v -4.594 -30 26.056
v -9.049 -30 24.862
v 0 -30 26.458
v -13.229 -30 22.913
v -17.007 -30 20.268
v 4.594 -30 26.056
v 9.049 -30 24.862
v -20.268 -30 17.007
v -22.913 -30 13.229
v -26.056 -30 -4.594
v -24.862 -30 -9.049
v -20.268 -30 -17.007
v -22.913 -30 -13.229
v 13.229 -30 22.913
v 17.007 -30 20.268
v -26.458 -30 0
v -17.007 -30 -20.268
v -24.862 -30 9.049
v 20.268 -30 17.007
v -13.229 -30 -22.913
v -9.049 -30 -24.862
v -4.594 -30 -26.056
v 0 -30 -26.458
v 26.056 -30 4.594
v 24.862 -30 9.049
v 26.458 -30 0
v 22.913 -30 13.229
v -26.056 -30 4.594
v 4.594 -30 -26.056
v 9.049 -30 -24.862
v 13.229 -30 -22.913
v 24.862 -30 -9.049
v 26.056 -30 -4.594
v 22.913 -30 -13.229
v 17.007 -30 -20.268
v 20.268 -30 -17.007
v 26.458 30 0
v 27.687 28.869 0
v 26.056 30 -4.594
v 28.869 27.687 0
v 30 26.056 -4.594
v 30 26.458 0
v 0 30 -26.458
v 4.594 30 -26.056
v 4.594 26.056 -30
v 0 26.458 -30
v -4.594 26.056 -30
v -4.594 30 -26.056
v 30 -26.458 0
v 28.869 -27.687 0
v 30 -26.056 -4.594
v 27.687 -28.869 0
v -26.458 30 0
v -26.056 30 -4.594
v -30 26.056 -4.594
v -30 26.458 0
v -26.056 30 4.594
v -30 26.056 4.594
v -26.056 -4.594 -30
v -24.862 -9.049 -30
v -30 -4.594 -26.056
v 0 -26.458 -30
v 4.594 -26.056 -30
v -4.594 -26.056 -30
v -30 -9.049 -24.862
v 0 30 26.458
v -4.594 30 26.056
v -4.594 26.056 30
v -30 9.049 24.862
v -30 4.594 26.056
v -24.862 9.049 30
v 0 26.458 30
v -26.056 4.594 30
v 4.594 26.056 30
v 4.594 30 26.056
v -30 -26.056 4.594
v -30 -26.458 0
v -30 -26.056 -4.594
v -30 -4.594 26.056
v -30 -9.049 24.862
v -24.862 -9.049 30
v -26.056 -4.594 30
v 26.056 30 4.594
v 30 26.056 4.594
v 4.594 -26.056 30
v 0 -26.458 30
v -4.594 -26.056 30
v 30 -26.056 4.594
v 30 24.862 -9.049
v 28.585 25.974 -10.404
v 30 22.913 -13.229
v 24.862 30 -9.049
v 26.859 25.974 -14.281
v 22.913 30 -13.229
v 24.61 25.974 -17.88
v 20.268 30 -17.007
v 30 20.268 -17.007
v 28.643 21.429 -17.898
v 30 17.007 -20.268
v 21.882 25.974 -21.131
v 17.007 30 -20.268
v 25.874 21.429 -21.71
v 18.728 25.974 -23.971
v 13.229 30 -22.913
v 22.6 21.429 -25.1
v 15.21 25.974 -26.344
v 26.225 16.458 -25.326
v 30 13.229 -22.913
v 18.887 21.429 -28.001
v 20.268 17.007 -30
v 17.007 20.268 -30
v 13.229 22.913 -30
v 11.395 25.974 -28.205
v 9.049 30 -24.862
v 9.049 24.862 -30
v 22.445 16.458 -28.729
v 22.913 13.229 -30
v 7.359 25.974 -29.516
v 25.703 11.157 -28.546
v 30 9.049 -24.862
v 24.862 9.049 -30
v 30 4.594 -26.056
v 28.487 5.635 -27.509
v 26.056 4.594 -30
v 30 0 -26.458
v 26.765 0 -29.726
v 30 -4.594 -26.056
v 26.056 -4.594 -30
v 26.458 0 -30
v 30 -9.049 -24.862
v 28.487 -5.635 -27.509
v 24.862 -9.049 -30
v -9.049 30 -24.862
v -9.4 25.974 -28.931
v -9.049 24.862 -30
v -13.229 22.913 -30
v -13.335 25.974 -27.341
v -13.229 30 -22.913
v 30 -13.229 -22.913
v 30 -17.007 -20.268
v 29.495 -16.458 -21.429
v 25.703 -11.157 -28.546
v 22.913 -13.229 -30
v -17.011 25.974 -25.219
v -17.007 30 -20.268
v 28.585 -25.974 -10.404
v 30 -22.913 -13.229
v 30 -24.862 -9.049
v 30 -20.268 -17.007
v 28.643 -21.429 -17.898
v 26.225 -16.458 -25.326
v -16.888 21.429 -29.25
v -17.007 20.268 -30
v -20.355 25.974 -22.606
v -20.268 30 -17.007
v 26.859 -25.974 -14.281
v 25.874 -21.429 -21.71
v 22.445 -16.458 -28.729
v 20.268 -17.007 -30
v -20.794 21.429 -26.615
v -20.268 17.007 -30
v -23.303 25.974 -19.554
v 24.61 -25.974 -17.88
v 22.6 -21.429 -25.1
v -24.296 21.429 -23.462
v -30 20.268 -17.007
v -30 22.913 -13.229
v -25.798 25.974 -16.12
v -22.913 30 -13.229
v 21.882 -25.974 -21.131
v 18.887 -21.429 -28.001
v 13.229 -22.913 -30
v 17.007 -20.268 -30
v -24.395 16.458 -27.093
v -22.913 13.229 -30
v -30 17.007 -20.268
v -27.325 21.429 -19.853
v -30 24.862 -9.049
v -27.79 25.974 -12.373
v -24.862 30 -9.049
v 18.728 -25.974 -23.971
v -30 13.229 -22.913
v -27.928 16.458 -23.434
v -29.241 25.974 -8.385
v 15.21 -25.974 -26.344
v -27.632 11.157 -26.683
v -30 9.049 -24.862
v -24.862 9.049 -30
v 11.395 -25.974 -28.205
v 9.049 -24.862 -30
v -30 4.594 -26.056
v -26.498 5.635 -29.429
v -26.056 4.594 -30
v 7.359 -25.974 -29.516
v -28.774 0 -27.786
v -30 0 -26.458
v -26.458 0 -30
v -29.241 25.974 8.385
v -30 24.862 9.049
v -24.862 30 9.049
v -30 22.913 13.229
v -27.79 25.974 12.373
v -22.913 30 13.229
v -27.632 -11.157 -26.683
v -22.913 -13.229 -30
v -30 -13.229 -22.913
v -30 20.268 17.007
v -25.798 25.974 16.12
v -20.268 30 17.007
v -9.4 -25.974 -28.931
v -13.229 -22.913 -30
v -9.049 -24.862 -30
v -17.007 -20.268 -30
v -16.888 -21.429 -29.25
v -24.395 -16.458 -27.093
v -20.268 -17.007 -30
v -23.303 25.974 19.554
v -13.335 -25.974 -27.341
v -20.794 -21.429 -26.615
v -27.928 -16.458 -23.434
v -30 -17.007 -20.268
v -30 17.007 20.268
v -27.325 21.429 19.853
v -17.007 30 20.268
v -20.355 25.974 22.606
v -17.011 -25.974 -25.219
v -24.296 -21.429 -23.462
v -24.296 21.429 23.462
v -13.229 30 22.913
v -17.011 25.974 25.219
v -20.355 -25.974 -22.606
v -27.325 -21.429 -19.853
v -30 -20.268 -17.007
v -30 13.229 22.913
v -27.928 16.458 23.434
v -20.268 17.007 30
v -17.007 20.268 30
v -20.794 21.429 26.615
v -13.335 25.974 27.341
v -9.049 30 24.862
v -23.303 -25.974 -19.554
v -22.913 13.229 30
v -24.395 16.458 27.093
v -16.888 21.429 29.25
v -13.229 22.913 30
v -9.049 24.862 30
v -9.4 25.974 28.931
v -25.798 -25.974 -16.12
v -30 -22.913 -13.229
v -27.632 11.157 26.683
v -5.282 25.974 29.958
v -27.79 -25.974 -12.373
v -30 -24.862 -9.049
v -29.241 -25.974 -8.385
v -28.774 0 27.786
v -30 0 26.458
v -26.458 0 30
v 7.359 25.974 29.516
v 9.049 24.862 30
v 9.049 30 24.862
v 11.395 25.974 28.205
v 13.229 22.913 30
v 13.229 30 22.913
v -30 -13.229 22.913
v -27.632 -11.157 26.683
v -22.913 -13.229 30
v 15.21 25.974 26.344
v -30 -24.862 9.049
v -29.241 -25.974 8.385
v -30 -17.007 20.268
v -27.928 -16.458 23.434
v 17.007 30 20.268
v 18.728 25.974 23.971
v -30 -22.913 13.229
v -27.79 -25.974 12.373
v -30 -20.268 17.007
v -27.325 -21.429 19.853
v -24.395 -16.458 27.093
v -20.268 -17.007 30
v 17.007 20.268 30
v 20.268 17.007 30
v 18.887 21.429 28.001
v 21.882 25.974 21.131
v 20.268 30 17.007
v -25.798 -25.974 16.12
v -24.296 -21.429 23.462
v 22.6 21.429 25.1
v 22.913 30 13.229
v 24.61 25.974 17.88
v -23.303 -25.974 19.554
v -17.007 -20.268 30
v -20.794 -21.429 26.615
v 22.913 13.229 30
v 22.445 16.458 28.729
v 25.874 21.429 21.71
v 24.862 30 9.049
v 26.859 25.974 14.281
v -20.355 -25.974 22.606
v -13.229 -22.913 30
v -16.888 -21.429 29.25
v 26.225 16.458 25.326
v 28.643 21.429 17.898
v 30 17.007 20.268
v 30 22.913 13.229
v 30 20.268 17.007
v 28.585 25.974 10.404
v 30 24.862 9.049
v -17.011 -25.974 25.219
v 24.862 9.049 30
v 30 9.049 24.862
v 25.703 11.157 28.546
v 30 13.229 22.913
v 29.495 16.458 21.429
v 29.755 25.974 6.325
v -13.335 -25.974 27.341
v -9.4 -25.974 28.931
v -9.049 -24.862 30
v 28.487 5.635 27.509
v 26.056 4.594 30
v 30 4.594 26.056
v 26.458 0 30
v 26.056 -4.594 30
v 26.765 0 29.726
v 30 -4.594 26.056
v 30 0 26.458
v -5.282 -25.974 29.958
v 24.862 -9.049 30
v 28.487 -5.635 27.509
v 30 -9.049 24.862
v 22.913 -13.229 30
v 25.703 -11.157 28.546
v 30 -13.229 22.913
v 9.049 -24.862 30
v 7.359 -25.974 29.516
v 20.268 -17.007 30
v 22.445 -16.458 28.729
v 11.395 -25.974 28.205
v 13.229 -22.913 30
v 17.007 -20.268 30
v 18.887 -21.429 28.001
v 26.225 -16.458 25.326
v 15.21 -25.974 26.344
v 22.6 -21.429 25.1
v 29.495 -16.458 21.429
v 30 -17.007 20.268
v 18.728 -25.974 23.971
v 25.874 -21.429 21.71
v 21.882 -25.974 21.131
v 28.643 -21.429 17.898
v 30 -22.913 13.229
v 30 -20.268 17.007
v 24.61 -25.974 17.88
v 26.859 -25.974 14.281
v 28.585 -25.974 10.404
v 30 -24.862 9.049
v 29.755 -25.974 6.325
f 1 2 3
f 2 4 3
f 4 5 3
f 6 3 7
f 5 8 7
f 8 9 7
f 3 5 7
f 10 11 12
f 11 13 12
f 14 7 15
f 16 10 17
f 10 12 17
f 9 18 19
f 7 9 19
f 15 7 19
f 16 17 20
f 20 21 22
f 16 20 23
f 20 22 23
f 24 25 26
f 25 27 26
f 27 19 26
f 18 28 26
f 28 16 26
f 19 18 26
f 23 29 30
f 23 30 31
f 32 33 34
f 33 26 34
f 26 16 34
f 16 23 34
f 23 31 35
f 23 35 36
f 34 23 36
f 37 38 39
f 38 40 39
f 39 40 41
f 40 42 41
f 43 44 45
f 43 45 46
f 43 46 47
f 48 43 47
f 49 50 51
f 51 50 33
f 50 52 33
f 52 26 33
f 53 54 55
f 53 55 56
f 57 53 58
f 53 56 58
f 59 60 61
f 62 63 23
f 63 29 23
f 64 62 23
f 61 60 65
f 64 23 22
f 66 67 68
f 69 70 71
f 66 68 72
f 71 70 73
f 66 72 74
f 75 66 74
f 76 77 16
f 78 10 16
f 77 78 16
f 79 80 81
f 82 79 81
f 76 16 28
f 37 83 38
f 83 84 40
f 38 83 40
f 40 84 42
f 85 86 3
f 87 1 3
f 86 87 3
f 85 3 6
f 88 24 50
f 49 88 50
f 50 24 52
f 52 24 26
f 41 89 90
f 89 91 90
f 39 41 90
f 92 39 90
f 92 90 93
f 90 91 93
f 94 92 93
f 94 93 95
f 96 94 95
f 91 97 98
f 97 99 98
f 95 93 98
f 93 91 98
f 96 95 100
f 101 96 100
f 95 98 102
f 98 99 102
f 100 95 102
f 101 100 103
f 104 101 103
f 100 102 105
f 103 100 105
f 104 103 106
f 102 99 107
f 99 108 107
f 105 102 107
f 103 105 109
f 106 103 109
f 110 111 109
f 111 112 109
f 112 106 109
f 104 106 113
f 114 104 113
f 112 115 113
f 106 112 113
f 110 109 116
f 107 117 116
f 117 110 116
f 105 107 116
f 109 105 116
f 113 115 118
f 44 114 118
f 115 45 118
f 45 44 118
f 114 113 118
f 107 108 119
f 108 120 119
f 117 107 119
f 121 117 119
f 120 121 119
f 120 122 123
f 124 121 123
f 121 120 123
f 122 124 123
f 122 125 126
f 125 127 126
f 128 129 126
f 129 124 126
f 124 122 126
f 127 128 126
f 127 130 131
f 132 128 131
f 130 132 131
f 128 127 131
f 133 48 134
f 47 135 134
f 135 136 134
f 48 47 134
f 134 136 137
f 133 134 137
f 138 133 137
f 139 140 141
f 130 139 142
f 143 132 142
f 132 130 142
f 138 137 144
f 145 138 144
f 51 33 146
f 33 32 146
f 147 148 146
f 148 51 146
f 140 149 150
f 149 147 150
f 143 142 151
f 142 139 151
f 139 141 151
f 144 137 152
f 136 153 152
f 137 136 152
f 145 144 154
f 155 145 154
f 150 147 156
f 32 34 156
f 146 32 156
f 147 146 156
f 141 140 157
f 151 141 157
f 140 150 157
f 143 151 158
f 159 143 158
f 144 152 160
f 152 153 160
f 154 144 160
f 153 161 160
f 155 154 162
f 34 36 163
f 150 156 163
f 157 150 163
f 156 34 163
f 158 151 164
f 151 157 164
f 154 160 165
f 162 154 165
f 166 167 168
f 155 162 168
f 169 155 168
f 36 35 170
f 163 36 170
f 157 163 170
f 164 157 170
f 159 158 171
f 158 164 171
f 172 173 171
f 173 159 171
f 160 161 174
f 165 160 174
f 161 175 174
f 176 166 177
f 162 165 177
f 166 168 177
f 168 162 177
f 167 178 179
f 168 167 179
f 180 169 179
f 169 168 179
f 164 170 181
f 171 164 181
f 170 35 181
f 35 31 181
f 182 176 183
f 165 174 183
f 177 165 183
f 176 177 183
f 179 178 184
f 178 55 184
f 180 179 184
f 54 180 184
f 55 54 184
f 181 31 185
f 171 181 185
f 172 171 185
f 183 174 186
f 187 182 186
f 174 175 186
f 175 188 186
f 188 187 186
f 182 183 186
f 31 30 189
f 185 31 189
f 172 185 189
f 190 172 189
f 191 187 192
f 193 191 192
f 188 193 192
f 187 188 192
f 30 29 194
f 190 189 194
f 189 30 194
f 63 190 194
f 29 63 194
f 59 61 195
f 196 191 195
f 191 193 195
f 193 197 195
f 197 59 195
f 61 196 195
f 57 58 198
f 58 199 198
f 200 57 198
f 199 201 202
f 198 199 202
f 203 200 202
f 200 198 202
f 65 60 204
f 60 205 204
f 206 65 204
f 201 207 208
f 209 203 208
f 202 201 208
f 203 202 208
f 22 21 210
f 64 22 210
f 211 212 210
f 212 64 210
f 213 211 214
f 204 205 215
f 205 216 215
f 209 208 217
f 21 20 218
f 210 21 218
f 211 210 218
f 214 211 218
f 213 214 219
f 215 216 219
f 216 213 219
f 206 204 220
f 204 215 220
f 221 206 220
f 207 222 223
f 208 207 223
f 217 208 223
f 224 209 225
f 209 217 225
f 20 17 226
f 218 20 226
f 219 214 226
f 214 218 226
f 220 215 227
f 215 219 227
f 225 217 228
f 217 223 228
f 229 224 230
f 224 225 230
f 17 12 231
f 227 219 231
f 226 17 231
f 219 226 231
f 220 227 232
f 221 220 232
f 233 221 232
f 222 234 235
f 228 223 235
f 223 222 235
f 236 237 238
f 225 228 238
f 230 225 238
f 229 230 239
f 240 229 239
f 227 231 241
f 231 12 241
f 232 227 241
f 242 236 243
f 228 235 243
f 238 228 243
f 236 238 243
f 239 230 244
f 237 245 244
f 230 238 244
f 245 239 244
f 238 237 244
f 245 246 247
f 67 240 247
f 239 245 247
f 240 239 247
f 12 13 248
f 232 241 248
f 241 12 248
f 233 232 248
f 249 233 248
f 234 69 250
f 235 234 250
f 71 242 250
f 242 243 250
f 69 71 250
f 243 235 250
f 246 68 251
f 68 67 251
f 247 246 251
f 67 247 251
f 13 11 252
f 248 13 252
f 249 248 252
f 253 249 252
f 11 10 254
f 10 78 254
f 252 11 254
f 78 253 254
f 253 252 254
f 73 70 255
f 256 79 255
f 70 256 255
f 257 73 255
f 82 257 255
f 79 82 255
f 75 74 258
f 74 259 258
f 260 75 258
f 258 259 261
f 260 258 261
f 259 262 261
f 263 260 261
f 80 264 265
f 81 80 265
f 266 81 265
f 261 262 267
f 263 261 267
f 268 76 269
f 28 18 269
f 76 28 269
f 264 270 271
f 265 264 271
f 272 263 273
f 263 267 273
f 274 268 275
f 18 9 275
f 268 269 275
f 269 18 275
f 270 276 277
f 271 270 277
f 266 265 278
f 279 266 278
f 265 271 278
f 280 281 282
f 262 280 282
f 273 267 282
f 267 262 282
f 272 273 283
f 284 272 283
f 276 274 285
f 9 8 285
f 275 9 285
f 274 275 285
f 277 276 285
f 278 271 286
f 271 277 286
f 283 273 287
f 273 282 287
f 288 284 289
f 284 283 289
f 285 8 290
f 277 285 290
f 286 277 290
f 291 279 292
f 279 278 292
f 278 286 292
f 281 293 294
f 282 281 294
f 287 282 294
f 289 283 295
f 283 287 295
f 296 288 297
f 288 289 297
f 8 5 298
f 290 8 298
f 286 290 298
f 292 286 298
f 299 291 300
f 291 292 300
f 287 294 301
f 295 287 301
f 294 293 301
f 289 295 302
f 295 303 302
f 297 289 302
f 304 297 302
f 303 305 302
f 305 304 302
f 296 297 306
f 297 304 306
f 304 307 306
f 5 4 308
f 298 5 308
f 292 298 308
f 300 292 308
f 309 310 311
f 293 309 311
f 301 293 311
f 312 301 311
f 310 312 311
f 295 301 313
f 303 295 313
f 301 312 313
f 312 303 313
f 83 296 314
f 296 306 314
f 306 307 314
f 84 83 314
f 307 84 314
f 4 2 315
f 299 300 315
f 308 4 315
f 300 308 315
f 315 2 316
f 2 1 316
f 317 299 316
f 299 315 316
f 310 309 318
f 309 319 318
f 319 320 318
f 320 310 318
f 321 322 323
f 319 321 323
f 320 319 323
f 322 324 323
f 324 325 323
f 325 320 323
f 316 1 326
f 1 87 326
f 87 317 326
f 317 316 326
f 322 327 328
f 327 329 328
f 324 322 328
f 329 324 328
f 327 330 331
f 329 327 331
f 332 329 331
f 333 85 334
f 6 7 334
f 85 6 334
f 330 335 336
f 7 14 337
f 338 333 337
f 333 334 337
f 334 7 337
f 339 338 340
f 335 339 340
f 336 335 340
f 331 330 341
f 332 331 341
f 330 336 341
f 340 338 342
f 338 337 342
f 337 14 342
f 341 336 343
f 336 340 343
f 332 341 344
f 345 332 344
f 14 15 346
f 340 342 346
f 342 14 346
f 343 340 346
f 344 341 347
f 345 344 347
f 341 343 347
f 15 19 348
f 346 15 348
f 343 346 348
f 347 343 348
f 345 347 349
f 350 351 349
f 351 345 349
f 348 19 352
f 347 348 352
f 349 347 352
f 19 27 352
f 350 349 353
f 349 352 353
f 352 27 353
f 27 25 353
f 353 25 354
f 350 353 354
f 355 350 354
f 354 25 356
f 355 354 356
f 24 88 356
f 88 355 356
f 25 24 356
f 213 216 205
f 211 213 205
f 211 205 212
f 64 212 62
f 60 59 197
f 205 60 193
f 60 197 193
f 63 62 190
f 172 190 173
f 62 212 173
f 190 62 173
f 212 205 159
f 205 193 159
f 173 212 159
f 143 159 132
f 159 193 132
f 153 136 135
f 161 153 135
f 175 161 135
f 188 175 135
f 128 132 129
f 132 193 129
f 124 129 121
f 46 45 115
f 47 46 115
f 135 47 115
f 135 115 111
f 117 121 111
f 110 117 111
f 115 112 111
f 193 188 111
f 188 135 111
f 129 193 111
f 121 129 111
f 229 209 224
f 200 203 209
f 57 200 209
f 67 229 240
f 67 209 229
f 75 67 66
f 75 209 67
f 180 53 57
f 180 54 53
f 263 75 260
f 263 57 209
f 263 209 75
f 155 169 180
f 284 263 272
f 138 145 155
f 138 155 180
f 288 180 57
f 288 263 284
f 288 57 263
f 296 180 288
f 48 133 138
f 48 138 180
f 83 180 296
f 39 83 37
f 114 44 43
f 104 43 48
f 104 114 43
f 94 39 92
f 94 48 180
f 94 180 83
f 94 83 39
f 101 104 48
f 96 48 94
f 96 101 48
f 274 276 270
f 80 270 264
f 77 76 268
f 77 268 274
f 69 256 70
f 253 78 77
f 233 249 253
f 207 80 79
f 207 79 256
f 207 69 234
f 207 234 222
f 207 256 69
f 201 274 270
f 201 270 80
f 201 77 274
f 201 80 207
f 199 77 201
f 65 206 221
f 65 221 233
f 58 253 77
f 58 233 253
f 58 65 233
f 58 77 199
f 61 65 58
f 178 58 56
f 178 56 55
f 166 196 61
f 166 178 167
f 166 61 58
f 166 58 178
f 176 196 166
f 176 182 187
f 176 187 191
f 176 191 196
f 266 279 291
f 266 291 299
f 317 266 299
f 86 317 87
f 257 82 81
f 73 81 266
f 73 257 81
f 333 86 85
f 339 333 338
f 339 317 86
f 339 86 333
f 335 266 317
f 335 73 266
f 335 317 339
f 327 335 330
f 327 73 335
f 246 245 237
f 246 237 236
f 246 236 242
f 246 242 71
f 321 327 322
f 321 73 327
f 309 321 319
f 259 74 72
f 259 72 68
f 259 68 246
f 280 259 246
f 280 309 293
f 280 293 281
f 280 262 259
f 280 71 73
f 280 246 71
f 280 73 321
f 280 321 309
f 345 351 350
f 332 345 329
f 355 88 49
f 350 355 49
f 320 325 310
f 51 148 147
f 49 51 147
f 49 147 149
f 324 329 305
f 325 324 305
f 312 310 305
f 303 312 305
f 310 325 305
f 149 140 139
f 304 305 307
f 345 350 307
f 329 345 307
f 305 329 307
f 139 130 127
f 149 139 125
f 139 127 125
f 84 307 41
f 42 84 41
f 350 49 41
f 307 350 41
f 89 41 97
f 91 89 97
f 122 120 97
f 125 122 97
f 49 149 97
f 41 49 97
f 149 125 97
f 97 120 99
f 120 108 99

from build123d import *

# Parameters (mm, degrees)
P_IDAT_VYSUNUT_M1_DEPTH      = 30
P_IDAT_VYSUNUT_M1_DEPTH_BACK = 30
SKICA2_W                     = 60
SKICA2_H                     = 60


with BuildPart() as part:
    # Skica1 → Rotovat1 (revolve)
    with BuildSketch(Plane.XY):
        with BuildLine():
            Line((0, -40), (0, 40))
            ThreePointArc((0, 40), (40, 0), (0, -40))
        make_face()
    revolve(axis=Axis((0, -40, 0), (0, 1, 0)))


with BuildPart() as body_2:
    # Skica2 → Přidat vysunutím1 (new, two sides: drawn at the far end of the back side and taken through both)
    with BuildSketch(Plane.XY.offset(-P_IDAT_VYSUNUT_M1_DEPTH_BACK)):
        Rectangle(SKICA2_W, SKICA2_H)
    extrude(amount=P_IDAT_VYSUNUT_M1_DEPTH + P_IDAT_VYSUNUT_M1_DEPTH_BACK)


with BuildPart() as part_1:
    add(part.part)

    # Průsečík3: read off the stored shape, not the designer's step
    # Průsečík3: intersect body 2
    add(body_2.part, mode=Mode.INTERSECT)


solid = part_1.part
